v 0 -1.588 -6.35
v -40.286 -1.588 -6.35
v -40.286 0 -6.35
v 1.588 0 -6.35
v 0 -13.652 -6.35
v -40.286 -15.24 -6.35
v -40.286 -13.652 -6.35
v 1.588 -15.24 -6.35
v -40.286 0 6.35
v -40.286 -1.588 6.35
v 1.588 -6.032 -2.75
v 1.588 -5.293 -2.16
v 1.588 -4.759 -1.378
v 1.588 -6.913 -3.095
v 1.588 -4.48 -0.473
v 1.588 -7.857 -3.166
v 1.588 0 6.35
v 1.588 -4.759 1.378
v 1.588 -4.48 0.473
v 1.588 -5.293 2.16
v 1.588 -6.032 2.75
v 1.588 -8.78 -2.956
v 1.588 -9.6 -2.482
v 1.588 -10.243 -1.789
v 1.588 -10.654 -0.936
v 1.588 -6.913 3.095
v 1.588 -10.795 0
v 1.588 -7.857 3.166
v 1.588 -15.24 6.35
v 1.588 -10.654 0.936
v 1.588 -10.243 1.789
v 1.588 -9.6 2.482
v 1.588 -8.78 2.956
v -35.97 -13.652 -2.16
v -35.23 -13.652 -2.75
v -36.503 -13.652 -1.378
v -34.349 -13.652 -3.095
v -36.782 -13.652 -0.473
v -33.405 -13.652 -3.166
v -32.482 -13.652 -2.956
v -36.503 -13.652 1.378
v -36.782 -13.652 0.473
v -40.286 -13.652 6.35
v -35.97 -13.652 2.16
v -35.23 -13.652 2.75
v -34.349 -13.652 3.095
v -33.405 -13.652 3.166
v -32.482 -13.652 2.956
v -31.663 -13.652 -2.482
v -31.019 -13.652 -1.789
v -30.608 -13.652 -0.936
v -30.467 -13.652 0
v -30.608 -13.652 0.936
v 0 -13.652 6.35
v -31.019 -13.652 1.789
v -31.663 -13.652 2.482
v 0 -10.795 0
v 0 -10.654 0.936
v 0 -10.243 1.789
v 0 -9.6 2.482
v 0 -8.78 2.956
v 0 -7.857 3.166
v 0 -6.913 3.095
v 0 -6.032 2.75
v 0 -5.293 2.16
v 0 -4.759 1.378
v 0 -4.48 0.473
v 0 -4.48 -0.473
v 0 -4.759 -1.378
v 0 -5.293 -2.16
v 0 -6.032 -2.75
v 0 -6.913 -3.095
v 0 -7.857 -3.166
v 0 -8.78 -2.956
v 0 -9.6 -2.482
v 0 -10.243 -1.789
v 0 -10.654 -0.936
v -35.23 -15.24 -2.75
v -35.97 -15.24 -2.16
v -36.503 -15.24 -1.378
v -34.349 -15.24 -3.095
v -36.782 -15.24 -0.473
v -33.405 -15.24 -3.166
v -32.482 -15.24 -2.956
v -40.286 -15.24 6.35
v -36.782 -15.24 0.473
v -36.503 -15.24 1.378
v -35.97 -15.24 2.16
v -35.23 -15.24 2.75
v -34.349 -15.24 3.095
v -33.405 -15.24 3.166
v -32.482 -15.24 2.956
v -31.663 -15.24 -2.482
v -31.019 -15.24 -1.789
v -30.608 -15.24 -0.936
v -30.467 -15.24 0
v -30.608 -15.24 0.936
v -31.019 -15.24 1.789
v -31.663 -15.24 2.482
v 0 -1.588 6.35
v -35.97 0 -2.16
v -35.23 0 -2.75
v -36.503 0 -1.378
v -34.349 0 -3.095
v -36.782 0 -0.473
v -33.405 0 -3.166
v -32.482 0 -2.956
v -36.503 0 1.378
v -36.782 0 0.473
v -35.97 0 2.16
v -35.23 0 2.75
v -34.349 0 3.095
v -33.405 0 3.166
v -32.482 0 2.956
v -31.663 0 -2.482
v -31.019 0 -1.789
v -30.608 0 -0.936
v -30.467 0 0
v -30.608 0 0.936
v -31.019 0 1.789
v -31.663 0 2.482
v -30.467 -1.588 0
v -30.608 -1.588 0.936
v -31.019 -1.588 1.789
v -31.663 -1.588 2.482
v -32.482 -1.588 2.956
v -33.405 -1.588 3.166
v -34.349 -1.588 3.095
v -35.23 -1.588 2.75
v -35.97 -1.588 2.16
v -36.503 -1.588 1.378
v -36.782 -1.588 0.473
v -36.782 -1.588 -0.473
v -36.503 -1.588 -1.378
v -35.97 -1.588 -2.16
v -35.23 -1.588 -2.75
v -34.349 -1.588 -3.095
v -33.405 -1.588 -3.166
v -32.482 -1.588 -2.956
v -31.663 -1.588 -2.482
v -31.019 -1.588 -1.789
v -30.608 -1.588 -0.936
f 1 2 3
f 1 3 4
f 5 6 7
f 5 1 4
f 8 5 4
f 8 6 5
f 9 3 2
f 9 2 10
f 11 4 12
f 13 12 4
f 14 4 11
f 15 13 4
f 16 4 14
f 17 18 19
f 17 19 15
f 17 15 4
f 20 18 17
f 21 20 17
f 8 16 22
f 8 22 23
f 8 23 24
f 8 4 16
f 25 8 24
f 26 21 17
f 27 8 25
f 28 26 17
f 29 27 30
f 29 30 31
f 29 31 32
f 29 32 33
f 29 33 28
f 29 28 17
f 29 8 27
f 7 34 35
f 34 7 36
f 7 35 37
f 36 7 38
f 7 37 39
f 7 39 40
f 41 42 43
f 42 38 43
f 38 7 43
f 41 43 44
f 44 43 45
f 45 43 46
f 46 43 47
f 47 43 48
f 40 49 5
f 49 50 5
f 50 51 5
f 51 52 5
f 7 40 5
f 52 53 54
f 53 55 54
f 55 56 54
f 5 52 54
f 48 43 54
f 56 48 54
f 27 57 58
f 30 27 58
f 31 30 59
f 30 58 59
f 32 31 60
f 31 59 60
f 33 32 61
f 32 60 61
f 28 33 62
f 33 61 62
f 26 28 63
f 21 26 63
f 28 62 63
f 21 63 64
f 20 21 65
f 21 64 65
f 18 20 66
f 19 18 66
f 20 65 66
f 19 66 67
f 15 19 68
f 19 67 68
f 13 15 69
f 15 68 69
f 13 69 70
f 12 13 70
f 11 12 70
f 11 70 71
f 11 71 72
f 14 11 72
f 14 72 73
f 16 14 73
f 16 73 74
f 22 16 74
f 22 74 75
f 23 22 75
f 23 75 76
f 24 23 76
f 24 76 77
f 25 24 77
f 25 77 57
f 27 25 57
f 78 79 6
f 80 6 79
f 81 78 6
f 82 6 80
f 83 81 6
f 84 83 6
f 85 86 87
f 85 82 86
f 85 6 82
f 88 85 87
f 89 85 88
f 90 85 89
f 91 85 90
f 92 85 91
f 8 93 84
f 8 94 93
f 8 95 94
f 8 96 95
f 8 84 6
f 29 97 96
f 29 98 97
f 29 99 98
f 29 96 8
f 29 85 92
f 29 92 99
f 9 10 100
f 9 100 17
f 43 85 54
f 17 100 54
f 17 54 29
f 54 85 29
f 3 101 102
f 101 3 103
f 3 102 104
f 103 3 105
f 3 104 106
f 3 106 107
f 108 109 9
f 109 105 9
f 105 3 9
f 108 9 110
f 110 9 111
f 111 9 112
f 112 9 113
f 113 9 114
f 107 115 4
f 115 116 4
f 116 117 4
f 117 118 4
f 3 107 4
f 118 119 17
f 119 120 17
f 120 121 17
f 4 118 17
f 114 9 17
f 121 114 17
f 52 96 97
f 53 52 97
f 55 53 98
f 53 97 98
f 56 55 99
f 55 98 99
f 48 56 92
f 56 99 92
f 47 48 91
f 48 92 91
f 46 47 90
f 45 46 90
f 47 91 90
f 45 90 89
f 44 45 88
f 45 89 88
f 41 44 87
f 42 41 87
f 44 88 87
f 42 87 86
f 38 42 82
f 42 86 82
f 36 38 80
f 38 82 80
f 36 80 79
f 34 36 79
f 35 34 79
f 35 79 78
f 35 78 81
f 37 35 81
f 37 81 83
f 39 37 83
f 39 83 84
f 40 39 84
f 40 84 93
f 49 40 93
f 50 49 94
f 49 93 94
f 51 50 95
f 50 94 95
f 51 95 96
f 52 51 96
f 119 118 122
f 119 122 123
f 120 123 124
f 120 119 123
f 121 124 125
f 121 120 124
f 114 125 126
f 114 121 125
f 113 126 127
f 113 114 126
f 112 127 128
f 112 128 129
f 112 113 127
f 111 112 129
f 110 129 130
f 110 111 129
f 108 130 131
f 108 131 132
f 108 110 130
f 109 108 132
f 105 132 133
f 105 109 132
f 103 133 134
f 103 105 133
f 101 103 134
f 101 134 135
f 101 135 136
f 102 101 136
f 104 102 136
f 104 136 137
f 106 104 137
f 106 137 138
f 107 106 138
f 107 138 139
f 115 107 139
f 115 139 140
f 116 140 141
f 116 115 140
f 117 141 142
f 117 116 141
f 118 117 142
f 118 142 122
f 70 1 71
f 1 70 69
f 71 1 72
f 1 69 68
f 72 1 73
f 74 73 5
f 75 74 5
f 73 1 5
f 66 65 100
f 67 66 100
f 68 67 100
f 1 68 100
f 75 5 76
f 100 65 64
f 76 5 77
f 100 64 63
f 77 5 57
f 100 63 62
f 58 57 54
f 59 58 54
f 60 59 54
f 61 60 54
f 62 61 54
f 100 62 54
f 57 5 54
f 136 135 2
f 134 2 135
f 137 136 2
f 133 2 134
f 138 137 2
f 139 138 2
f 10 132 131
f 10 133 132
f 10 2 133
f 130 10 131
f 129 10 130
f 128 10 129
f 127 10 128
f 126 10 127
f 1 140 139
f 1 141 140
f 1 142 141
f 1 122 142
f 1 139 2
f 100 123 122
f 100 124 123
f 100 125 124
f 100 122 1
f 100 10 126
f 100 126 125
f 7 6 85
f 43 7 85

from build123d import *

# Parameters (mm, degrees)
F0_W     = 40.2857027948
F0_H     = 12.7
F0_R     = 3.175
F1_DEPTH = 1.5875
F0_W_2   = 1.5875
F2_DEPTH = 7.62
F4_R     = 3.175
F5_DEPTH = 25.4


# Not quite as in the source:
# - a length typed as a fraction of an inch, garbled in the dataset ("3 / 203.2 mm" for 3/8 in), is restored


with BuildPart() as f1:
    # F0 (on Front) → F1 (new body)
    with BuildSketch(Plane.XZ):
        with Locations((-20.1428513974, 0)):
            Rectangle(F0_W, F0_H)
        with Locations((-33.6422286928, 0)):
            Circle(F0_R, mode=Mode.SUBTRACT)
    extrude(amount=F1_DEPTH)

    # F0 (on Front) → F2 (join)
    with BuildSketch(Plane.XZ):
        with Locations((0.79375, 0)):
            Rectangle(F0_W_2, F0_H)
    extrude(amount=F2_DEPTH)

    # F3: F1 across face


with BuildPart() as f1_1:
    add(f1.part)
    add(f1.part.mirror(Plane(origin=(0.79375, -7.62, 0), x_dir=(1, 0, 0), z_dir=(0, -1, 0))))

    # F4 (on face) → F5 (cut)
    with BuildSketch(Plane(origin=(0, 0, 0), x_dir=(0, -1, 0), z_dir=(-1, 0, 0))):
        with Locations((7.62, 0)):
            Circle(F4_R)
    extrude(amount=-F5_DEPTH, mode=Mode.SUBTRACT)


solid = f1_1.part
